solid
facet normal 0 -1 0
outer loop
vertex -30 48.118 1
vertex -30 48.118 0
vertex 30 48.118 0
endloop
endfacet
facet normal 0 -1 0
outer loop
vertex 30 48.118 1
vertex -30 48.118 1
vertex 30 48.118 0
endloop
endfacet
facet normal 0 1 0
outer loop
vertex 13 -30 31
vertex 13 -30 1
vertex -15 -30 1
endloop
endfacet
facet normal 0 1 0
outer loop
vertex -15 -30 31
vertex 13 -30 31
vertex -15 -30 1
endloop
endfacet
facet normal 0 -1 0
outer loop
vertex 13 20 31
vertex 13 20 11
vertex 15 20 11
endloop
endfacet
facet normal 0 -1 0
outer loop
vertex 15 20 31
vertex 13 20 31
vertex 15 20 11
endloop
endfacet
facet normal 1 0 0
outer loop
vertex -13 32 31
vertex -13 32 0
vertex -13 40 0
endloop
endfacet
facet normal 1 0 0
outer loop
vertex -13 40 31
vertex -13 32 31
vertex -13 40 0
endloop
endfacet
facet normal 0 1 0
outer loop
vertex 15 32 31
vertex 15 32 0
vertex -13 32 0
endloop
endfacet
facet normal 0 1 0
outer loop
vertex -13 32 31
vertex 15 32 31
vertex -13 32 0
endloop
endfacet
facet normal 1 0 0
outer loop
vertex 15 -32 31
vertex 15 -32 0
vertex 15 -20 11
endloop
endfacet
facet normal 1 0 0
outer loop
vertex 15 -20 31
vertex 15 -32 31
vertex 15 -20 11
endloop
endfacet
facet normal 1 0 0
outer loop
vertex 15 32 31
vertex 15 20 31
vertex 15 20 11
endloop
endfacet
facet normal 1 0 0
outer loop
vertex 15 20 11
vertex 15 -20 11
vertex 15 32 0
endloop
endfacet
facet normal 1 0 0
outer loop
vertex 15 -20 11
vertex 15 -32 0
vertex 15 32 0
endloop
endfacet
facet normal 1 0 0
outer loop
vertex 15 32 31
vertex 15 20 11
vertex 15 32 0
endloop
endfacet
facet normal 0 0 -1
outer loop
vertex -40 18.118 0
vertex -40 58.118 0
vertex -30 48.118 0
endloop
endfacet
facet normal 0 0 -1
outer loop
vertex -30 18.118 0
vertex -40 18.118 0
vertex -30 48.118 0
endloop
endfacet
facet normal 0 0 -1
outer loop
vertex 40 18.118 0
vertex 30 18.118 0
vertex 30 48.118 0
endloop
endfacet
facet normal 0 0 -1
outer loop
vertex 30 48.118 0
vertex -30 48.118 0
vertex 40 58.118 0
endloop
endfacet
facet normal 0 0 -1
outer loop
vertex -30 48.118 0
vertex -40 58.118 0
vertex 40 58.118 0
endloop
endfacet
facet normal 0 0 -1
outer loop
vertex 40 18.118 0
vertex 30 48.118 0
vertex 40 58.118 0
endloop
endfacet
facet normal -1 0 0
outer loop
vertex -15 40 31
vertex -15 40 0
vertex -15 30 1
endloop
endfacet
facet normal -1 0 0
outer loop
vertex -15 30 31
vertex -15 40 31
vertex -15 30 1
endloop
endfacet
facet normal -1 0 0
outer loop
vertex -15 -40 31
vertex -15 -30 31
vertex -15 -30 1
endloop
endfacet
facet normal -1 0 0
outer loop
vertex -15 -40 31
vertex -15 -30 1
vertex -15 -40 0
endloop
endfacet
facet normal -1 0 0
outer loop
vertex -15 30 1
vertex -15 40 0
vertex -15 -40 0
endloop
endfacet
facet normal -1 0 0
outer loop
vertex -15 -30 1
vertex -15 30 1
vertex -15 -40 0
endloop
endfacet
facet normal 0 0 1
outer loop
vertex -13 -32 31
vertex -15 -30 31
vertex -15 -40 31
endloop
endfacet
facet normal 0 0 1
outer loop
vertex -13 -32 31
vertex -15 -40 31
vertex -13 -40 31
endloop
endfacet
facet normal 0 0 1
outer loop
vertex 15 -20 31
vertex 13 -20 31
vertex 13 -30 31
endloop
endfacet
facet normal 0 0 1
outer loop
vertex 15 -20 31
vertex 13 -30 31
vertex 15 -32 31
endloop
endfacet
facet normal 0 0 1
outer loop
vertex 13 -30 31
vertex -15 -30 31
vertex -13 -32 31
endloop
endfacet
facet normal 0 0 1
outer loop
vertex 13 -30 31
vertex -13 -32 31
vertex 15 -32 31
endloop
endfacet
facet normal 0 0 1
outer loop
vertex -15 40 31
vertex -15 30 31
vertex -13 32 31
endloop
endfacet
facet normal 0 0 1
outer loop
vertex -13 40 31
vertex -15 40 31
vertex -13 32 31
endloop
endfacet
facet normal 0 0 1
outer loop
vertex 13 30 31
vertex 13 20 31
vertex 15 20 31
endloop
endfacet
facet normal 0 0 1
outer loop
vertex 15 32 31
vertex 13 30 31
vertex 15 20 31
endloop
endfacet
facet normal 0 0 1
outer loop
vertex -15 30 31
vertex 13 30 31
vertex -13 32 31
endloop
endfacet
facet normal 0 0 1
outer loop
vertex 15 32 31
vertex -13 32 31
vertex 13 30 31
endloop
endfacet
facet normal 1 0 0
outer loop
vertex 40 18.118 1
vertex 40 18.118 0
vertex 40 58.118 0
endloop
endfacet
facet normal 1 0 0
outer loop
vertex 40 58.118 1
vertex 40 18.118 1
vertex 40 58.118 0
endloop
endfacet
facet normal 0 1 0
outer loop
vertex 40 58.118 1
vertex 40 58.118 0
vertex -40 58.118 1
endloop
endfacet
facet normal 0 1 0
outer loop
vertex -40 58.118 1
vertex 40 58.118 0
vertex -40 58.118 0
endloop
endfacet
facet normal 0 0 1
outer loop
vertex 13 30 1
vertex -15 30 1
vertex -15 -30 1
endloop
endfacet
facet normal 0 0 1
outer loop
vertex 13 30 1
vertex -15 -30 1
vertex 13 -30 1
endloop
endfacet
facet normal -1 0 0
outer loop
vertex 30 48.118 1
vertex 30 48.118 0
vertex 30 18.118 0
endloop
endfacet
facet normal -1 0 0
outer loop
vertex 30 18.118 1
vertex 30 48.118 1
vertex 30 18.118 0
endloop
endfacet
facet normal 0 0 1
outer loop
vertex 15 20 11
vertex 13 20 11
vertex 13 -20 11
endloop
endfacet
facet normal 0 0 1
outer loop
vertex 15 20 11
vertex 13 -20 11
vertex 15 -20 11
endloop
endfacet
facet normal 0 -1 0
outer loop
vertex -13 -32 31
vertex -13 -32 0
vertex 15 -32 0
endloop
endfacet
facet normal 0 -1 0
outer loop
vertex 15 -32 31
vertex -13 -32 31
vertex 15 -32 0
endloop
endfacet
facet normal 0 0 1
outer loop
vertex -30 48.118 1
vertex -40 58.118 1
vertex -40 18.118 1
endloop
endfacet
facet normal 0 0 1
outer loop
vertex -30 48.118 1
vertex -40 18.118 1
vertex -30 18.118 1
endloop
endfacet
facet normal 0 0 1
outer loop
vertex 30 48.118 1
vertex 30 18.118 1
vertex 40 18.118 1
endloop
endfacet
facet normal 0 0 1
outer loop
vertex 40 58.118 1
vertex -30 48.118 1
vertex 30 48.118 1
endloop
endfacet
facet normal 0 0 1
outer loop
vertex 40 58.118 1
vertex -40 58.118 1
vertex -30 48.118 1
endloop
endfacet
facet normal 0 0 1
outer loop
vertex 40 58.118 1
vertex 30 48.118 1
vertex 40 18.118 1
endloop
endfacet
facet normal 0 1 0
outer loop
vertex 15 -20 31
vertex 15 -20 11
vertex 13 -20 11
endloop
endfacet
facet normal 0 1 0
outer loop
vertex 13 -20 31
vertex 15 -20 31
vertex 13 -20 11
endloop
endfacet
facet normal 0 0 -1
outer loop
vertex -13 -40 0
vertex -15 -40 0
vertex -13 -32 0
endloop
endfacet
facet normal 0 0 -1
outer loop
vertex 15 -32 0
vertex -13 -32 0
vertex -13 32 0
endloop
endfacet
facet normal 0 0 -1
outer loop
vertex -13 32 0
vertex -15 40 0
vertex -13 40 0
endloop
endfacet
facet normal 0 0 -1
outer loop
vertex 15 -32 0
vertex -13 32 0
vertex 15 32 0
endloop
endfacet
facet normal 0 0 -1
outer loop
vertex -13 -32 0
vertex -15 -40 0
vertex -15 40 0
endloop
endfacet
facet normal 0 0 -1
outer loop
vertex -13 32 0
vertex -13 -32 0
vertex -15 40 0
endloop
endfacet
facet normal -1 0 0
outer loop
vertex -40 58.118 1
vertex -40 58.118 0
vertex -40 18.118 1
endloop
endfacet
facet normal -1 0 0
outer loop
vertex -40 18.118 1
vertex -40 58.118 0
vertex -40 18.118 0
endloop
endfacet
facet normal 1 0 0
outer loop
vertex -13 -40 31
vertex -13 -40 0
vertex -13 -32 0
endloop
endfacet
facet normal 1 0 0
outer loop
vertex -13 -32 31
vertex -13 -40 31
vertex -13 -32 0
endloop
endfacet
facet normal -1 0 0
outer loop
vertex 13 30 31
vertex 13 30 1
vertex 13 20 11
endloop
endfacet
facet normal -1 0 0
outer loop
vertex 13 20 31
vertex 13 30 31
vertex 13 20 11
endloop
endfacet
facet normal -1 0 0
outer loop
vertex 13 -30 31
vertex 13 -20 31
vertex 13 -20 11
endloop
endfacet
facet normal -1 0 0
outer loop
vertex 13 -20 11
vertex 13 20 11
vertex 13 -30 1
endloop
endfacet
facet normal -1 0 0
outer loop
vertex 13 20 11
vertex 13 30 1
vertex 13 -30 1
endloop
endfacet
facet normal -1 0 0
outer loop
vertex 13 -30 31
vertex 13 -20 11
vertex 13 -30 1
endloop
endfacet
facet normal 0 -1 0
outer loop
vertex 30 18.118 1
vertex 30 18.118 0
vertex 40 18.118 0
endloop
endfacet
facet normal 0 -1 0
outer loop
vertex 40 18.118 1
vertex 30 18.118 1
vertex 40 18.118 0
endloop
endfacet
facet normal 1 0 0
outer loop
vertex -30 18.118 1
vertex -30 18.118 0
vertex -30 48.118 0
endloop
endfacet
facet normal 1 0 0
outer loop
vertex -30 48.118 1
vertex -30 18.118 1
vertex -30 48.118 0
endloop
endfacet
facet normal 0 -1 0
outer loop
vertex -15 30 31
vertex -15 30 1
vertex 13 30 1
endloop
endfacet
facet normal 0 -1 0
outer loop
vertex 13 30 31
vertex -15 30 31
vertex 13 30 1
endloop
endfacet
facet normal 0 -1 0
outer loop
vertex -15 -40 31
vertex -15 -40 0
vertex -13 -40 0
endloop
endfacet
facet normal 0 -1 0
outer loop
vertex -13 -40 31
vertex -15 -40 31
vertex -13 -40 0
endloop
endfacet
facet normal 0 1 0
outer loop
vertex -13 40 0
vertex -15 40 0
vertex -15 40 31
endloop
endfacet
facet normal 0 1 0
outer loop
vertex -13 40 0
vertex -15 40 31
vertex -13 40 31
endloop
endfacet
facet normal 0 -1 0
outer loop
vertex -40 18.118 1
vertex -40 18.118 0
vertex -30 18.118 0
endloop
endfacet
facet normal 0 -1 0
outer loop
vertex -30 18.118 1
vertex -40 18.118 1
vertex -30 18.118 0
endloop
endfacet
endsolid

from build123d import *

# Parameters (mm, degrees)
F0_W     = 2
F0_H     = 40
F1_DEPTH = 11
F0_H_2   = 8
F2_DEPTH = 31
F3_DEPTH = 1
F5_DEPTH = 1


with BuildPart() as f1:
    # F0 (on Top) → F1 (new body)
    with BuildSketch(Plane.XY):
        with Locations((14, 0)):
            Rectangle(F0_W, F0_H)
    extrude(amount=F1_DEPTH)

    # F0 (on Top) → F2 (join)
    with BuildSketch(Plane.XY):
        with Locations((-14, 36)):
            Rectangle(F0_W, F0_H_2)
        Polygon((-13, 32), (-15, 32), (-15, 30), (13, 30), (13, 20), (15, 20), (15, 32), align=None)
        Polygon((13, -30), (-15, -30), (-15, -32), (-13, -32), (15, -32), (15, -20), (13, -20), align=None)
        with Locations((-14, -36)):
            Rectangle(F0_W, F0_H_2)
    extrude(amount=F2_DEPTH)

    # F0 (on Top) → F3 (join)
    with BuildSketch(Plane.XY):
        Polygon((13, 30), (-15, 30), (-15, -30), (13, -30), (13, -20), (13, 20), align=None)
    extrude(amount=F3_DEPTH)


with BuildPart() as f5:
    # F4 (on Top) → F5 (new body)
    with BuildSketch(Plane.XY):
        Polygon((-40, 58.118098), (-40, 18.118098), (-30, 18.118098), (-30, 48.118098), (30, 48.118098), (30, 18.118098), (40, 18.118098), (40, 58.118098), align=None)
    extrude(amount=F5_DEPTH)


solid = Compound([f1.part, f5.part])
